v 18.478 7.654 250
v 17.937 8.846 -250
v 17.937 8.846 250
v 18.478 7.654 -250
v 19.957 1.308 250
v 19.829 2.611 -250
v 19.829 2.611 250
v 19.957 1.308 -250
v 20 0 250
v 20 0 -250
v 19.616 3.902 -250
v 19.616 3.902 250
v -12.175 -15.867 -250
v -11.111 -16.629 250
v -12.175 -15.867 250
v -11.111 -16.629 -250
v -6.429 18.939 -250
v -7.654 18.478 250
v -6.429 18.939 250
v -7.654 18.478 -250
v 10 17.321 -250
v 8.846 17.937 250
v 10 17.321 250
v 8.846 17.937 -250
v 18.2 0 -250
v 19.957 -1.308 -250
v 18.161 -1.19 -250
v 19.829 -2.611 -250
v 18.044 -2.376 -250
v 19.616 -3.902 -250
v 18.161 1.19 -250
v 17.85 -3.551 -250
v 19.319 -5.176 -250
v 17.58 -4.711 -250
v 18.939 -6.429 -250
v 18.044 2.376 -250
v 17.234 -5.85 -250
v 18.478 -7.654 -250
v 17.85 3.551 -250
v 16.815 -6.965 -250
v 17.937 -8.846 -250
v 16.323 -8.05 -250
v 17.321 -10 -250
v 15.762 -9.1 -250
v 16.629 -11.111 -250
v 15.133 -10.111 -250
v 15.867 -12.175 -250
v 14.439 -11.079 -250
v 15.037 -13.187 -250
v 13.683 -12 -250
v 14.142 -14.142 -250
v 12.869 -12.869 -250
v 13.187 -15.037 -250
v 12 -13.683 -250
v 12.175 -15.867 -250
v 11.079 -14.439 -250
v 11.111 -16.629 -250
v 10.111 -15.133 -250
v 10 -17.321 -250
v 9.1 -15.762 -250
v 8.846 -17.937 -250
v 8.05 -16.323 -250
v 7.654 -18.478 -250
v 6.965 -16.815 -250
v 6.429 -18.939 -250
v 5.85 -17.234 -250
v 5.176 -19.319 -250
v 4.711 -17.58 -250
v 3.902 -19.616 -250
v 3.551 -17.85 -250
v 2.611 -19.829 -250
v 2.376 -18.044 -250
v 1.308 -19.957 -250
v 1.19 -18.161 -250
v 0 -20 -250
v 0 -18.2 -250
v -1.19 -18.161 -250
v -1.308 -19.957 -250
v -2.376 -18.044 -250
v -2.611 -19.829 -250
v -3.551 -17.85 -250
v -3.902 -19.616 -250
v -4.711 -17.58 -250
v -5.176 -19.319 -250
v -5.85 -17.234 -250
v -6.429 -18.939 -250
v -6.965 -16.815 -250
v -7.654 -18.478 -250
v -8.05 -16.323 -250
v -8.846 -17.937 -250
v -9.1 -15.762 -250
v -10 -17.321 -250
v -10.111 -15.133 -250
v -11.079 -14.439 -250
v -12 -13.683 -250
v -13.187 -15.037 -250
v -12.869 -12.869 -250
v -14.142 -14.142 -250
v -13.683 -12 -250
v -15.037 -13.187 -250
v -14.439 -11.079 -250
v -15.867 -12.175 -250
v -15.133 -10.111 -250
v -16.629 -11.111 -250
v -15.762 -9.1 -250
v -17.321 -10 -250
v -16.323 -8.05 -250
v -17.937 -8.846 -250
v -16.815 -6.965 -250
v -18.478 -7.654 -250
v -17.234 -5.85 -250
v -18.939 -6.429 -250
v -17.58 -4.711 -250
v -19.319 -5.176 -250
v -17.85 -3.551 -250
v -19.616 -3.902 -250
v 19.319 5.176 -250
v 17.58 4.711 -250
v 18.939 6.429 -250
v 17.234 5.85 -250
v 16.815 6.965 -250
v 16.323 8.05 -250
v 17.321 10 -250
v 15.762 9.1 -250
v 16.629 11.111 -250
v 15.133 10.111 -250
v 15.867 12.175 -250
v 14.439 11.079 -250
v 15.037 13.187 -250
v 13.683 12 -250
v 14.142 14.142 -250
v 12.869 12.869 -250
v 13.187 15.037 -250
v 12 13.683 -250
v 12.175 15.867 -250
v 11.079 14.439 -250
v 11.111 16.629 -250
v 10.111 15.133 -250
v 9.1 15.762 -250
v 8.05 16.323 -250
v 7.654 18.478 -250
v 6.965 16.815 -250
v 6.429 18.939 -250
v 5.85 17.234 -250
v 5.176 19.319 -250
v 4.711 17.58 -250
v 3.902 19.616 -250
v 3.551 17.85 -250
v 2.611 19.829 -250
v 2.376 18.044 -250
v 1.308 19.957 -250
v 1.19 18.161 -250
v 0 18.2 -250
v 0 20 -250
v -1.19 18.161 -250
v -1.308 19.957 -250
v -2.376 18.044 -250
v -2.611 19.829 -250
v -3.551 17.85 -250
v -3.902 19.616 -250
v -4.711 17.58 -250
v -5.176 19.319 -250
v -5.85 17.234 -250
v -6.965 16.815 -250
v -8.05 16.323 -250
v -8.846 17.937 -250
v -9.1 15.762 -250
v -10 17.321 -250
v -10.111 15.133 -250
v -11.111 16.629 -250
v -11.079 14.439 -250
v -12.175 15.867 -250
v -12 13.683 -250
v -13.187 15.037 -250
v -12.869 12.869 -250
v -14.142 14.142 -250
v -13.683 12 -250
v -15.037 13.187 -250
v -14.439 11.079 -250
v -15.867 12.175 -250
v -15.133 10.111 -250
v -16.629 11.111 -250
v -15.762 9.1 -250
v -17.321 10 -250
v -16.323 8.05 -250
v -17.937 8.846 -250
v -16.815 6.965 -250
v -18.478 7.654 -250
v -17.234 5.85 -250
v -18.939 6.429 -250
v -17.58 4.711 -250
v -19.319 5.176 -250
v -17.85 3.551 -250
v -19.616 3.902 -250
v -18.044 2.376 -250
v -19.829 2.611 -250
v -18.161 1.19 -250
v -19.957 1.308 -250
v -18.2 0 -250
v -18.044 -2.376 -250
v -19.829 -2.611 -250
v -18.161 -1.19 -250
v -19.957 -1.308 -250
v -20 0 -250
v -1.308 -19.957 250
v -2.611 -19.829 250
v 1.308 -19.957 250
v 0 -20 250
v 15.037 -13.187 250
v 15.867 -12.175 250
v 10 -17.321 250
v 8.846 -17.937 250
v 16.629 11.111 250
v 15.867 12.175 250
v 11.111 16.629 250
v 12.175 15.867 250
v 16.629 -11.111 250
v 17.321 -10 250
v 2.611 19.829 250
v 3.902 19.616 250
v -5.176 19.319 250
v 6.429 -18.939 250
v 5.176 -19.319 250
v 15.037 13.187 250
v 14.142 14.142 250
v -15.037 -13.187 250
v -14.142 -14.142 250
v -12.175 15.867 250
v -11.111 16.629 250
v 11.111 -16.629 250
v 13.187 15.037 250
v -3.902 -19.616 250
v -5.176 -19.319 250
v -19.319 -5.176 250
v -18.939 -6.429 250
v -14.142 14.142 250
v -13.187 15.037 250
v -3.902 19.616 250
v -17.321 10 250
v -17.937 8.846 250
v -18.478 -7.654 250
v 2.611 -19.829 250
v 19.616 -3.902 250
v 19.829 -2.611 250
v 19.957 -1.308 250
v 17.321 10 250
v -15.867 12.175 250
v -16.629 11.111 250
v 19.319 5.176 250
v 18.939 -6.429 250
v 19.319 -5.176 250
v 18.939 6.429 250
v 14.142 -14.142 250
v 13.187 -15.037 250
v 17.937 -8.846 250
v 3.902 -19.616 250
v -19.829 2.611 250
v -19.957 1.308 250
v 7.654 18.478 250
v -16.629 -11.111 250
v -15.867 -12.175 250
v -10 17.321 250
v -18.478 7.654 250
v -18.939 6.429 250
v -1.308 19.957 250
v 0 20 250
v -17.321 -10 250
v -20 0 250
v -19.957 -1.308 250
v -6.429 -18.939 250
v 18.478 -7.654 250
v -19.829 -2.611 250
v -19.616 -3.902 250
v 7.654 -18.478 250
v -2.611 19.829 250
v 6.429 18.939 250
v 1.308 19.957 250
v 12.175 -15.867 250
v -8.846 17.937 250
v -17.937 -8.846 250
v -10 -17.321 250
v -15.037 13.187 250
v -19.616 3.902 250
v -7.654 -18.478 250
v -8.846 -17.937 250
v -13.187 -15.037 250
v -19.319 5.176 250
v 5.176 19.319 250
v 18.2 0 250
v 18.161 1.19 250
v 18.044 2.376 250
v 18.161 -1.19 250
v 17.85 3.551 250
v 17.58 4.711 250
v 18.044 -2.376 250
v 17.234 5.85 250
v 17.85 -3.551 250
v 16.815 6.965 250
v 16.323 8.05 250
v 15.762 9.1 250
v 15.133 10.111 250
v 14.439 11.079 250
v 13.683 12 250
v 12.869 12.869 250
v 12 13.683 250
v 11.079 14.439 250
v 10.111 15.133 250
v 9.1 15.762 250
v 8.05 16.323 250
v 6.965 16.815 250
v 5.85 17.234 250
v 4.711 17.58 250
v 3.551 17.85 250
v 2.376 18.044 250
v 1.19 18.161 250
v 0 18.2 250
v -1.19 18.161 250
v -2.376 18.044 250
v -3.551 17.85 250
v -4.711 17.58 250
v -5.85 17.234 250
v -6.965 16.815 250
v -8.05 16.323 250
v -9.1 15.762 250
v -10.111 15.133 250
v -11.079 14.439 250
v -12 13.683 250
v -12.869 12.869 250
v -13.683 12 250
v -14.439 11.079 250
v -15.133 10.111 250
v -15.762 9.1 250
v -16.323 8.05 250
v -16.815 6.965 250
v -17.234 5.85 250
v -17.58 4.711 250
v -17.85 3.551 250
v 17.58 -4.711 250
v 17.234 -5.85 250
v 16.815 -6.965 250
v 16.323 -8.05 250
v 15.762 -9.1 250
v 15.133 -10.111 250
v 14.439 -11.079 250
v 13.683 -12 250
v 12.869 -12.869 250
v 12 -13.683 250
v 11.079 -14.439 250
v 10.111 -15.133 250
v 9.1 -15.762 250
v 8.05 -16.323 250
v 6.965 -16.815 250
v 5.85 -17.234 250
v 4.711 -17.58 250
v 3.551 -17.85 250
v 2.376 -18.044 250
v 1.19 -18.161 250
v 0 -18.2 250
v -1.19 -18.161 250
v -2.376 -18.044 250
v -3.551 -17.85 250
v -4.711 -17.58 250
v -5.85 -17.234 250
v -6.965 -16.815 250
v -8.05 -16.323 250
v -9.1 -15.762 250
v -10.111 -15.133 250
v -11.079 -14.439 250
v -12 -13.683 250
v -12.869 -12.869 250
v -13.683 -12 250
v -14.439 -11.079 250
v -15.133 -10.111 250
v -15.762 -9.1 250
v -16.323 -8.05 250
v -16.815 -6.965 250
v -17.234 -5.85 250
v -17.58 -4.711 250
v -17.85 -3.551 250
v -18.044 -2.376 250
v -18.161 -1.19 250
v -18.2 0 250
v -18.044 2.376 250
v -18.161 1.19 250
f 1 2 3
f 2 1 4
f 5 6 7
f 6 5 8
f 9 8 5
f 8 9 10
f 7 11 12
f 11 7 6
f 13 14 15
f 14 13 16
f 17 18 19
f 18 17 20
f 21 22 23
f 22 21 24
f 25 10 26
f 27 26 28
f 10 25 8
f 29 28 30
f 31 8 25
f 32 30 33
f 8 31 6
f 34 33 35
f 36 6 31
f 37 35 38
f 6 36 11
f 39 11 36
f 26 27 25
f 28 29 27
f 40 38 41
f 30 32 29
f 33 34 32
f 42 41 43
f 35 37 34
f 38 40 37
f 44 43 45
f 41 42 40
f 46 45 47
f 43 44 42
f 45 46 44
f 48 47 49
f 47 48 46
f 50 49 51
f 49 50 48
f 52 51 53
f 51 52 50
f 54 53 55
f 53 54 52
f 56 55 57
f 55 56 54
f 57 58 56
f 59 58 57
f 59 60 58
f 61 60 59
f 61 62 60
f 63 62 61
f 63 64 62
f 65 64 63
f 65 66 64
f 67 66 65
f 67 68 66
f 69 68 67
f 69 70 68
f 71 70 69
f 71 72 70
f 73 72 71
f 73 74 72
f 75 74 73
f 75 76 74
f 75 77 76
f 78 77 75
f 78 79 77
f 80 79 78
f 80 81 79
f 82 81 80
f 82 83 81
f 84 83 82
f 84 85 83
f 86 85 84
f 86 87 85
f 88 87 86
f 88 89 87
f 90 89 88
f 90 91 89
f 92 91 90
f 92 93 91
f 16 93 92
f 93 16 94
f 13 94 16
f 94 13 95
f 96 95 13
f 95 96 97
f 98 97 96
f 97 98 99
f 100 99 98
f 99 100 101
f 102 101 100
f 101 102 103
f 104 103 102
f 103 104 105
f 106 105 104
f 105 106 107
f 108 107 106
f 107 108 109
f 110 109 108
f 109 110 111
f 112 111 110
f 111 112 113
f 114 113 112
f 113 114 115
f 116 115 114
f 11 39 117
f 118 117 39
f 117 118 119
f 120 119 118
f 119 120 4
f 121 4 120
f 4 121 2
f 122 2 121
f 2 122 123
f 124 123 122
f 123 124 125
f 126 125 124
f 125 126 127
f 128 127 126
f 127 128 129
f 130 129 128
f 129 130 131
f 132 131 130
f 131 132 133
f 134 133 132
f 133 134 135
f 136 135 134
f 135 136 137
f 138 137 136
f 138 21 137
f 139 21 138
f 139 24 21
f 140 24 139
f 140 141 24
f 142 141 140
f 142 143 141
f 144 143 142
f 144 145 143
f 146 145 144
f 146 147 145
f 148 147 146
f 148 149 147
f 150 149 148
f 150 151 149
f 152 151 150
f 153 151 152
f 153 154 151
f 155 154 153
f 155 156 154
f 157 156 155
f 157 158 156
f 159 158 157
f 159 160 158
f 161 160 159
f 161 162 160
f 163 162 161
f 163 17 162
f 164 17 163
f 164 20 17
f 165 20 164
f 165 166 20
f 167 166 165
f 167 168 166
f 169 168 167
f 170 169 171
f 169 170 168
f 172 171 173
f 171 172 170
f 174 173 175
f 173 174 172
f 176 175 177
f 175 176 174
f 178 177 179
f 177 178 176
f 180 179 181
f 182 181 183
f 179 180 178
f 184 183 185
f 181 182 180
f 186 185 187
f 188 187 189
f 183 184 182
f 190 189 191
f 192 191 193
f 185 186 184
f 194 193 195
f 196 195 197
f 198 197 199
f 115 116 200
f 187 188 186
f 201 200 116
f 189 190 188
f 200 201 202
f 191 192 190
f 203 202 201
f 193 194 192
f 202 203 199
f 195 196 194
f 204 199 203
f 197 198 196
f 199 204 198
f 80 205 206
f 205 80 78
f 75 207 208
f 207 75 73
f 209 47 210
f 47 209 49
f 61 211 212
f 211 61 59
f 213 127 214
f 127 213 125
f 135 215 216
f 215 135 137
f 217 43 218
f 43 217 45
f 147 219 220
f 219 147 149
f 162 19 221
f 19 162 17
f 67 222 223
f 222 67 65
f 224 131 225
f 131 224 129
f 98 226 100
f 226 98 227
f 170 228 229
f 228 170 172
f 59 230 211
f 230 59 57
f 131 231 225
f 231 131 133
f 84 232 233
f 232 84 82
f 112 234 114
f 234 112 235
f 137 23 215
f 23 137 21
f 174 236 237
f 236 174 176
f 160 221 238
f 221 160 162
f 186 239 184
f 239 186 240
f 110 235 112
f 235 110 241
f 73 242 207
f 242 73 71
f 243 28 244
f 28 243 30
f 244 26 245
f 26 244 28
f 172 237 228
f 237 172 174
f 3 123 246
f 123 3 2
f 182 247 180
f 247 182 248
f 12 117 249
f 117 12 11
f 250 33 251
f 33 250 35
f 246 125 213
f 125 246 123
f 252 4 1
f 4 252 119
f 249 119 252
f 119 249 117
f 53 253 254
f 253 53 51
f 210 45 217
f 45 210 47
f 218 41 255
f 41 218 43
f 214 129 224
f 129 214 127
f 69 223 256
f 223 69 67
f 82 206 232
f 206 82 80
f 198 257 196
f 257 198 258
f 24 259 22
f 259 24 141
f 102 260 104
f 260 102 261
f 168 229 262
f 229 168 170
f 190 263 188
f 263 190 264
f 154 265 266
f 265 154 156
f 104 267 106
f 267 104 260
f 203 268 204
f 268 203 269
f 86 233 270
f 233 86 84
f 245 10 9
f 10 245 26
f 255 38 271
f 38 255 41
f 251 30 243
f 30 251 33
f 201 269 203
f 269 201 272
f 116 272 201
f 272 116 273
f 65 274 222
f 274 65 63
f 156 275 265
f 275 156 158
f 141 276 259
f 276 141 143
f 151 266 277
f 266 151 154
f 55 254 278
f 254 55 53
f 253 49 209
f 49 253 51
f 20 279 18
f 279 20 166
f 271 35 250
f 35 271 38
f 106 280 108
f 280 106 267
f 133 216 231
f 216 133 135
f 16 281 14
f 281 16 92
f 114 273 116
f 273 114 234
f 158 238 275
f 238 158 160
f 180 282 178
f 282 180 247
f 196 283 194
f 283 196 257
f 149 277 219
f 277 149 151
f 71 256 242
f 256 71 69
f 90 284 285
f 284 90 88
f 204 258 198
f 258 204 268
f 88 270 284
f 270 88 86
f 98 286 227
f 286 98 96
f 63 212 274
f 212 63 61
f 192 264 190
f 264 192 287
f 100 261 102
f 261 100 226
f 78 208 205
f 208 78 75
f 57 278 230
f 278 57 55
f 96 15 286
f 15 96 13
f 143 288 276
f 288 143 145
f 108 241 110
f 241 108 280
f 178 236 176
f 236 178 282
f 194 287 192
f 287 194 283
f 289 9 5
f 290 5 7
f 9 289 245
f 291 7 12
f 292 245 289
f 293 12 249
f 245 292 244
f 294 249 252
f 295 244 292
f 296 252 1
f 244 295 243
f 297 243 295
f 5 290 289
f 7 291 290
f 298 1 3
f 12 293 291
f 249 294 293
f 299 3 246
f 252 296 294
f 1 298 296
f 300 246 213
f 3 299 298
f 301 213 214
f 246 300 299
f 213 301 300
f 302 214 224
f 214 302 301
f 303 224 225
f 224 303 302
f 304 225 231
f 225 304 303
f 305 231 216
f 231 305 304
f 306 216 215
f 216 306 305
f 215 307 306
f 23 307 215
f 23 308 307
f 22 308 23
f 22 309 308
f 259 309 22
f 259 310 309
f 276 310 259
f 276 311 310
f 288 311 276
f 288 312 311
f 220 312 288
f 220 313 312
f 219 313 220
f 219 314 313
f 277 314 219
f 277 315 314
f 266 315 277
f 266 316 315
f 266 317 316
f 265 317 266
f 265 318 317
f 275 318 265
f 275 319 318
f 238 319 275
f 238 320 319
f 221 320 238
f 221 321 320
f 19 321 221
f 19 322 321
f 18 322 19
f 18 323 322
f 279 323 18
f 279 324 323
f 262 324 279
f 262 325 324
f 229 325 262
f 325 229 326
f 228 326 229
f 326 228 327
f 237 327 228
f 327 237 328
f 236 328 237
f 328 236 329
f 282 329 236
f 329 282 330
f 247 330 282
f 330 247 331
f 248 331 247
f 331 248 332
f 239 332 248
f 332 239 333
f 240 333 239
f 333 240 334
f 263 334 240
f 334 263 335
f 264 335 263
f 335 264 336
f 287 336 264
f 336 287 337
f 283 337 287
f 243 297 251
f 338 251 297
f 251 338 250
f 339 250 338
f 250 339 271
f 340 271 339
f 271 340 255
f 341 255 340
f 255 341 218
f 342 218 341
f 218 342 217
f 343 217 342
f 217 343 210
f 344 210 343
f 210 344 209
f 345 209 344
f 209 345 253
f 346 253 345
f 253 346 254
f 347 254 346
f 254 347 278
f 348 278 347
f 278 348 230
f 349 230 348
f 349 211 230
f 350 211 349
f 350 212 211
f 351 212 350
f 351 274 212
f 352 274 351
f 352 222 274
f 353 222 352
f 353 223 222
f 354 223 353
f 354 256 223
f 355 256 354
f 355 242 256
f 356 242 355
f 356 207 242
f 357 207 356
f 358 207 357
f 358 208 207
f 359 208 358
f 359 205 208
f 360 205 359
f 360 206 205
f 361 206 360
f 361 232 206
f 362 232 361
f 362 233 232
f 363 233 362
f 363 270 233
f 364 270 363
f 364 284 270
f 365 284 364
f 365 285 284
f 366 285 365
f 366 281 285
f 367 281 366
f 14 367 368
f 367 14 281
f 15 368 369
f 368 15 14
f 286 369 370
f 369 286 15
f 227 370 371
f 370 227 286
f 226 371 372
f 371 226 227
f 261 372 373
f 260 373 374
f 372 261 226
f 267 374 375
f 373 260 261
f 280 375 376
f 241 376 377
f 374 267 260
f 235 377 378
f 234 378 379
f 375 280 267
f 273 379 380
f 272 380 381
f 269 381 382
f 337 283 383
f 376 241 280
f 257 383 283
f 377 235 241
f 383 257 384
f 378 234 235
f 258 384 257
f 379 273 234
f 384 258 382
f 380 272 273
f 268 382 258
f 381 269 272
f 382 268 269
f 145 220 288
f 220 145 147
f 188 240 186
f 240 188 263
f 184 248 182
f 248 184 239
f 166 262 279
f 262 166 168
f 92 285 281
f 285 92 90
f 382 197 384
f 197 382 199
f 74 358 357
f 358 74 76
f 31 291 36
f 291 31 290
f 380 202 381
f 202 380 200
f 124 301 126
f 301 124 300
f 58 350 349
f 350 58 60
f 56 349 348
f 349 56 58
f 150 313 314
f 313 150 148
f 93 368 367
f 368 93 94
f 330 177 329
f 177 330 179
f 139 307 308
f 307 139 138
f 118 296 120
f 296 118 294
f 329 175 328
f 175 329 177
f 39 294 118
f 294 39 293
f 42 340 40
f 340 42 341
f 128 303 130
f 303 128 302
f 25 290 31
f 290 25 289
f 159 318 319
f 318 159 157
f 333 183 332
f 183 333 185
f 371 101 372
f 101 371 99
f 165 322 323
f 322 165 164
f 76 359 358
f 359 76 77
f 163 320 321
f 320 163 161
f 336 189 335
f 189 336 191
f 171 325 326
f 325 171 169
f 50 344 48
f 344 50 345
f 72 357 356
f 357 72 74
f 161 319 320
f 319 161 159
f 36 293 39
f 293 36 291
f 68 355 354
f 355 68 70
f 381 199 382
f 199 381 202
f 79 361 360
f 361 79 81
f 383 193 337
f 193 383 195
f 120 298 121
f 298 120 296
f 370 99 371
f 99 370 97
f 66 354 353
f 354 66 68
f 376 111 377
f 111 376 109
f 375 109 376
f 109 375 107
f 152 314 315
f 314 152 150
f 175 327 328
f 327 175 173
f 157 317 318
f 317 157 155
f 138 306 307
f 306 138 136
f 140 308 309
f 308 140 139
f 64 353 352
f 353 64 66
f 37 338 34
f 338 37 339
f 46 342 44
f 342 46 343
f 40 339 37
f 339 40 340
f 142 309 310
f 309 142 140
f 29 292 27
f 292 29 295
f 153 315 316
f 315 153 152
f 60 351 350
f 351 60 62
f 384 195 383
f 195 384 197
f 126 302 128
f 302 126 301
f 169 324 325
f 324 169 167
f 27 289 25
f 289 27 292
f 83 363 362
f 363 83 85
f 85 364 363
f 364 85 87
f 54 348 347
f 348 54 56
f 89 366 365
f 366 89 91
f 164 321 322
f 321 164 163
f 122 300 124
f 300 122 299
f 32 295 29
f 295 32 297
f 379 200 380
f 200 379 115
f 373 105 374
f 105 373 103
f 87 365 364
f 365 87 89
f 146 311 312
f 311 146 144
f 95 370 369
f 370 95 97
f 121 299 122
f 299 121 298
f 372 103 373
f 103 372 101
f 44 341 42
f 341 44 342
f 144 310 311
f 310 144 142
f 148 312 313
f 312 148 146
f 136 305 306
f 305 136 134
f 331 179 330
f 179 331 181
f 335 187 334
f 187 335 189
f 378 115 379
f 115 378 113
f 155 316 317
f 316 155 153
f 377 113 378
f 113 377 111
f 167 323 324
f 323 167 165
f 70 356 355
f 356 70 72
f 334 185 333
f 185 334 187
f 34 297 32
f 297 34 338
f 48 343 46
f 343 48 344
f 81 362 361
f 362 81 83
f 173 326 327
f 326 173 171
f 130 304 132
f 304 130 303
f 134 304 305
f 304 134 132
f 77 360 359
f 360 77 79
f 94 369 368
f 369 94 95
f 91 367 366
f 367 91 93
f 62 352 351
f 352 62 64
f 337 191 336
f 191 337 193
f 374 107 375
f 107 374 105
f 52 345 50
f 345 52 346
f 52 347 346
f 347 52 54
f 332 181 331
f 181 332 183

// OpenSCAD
$fn=96;

module ht_pipe(od=40, wall=1.8, length=500) {
    difference() {
        cylinder(h=length, d=od, center=true);
        cylinder(h=length+2, d=od-2*wall, center=true);
    }
}

ht_pipe(od=40, wall=1.8, length=500);
